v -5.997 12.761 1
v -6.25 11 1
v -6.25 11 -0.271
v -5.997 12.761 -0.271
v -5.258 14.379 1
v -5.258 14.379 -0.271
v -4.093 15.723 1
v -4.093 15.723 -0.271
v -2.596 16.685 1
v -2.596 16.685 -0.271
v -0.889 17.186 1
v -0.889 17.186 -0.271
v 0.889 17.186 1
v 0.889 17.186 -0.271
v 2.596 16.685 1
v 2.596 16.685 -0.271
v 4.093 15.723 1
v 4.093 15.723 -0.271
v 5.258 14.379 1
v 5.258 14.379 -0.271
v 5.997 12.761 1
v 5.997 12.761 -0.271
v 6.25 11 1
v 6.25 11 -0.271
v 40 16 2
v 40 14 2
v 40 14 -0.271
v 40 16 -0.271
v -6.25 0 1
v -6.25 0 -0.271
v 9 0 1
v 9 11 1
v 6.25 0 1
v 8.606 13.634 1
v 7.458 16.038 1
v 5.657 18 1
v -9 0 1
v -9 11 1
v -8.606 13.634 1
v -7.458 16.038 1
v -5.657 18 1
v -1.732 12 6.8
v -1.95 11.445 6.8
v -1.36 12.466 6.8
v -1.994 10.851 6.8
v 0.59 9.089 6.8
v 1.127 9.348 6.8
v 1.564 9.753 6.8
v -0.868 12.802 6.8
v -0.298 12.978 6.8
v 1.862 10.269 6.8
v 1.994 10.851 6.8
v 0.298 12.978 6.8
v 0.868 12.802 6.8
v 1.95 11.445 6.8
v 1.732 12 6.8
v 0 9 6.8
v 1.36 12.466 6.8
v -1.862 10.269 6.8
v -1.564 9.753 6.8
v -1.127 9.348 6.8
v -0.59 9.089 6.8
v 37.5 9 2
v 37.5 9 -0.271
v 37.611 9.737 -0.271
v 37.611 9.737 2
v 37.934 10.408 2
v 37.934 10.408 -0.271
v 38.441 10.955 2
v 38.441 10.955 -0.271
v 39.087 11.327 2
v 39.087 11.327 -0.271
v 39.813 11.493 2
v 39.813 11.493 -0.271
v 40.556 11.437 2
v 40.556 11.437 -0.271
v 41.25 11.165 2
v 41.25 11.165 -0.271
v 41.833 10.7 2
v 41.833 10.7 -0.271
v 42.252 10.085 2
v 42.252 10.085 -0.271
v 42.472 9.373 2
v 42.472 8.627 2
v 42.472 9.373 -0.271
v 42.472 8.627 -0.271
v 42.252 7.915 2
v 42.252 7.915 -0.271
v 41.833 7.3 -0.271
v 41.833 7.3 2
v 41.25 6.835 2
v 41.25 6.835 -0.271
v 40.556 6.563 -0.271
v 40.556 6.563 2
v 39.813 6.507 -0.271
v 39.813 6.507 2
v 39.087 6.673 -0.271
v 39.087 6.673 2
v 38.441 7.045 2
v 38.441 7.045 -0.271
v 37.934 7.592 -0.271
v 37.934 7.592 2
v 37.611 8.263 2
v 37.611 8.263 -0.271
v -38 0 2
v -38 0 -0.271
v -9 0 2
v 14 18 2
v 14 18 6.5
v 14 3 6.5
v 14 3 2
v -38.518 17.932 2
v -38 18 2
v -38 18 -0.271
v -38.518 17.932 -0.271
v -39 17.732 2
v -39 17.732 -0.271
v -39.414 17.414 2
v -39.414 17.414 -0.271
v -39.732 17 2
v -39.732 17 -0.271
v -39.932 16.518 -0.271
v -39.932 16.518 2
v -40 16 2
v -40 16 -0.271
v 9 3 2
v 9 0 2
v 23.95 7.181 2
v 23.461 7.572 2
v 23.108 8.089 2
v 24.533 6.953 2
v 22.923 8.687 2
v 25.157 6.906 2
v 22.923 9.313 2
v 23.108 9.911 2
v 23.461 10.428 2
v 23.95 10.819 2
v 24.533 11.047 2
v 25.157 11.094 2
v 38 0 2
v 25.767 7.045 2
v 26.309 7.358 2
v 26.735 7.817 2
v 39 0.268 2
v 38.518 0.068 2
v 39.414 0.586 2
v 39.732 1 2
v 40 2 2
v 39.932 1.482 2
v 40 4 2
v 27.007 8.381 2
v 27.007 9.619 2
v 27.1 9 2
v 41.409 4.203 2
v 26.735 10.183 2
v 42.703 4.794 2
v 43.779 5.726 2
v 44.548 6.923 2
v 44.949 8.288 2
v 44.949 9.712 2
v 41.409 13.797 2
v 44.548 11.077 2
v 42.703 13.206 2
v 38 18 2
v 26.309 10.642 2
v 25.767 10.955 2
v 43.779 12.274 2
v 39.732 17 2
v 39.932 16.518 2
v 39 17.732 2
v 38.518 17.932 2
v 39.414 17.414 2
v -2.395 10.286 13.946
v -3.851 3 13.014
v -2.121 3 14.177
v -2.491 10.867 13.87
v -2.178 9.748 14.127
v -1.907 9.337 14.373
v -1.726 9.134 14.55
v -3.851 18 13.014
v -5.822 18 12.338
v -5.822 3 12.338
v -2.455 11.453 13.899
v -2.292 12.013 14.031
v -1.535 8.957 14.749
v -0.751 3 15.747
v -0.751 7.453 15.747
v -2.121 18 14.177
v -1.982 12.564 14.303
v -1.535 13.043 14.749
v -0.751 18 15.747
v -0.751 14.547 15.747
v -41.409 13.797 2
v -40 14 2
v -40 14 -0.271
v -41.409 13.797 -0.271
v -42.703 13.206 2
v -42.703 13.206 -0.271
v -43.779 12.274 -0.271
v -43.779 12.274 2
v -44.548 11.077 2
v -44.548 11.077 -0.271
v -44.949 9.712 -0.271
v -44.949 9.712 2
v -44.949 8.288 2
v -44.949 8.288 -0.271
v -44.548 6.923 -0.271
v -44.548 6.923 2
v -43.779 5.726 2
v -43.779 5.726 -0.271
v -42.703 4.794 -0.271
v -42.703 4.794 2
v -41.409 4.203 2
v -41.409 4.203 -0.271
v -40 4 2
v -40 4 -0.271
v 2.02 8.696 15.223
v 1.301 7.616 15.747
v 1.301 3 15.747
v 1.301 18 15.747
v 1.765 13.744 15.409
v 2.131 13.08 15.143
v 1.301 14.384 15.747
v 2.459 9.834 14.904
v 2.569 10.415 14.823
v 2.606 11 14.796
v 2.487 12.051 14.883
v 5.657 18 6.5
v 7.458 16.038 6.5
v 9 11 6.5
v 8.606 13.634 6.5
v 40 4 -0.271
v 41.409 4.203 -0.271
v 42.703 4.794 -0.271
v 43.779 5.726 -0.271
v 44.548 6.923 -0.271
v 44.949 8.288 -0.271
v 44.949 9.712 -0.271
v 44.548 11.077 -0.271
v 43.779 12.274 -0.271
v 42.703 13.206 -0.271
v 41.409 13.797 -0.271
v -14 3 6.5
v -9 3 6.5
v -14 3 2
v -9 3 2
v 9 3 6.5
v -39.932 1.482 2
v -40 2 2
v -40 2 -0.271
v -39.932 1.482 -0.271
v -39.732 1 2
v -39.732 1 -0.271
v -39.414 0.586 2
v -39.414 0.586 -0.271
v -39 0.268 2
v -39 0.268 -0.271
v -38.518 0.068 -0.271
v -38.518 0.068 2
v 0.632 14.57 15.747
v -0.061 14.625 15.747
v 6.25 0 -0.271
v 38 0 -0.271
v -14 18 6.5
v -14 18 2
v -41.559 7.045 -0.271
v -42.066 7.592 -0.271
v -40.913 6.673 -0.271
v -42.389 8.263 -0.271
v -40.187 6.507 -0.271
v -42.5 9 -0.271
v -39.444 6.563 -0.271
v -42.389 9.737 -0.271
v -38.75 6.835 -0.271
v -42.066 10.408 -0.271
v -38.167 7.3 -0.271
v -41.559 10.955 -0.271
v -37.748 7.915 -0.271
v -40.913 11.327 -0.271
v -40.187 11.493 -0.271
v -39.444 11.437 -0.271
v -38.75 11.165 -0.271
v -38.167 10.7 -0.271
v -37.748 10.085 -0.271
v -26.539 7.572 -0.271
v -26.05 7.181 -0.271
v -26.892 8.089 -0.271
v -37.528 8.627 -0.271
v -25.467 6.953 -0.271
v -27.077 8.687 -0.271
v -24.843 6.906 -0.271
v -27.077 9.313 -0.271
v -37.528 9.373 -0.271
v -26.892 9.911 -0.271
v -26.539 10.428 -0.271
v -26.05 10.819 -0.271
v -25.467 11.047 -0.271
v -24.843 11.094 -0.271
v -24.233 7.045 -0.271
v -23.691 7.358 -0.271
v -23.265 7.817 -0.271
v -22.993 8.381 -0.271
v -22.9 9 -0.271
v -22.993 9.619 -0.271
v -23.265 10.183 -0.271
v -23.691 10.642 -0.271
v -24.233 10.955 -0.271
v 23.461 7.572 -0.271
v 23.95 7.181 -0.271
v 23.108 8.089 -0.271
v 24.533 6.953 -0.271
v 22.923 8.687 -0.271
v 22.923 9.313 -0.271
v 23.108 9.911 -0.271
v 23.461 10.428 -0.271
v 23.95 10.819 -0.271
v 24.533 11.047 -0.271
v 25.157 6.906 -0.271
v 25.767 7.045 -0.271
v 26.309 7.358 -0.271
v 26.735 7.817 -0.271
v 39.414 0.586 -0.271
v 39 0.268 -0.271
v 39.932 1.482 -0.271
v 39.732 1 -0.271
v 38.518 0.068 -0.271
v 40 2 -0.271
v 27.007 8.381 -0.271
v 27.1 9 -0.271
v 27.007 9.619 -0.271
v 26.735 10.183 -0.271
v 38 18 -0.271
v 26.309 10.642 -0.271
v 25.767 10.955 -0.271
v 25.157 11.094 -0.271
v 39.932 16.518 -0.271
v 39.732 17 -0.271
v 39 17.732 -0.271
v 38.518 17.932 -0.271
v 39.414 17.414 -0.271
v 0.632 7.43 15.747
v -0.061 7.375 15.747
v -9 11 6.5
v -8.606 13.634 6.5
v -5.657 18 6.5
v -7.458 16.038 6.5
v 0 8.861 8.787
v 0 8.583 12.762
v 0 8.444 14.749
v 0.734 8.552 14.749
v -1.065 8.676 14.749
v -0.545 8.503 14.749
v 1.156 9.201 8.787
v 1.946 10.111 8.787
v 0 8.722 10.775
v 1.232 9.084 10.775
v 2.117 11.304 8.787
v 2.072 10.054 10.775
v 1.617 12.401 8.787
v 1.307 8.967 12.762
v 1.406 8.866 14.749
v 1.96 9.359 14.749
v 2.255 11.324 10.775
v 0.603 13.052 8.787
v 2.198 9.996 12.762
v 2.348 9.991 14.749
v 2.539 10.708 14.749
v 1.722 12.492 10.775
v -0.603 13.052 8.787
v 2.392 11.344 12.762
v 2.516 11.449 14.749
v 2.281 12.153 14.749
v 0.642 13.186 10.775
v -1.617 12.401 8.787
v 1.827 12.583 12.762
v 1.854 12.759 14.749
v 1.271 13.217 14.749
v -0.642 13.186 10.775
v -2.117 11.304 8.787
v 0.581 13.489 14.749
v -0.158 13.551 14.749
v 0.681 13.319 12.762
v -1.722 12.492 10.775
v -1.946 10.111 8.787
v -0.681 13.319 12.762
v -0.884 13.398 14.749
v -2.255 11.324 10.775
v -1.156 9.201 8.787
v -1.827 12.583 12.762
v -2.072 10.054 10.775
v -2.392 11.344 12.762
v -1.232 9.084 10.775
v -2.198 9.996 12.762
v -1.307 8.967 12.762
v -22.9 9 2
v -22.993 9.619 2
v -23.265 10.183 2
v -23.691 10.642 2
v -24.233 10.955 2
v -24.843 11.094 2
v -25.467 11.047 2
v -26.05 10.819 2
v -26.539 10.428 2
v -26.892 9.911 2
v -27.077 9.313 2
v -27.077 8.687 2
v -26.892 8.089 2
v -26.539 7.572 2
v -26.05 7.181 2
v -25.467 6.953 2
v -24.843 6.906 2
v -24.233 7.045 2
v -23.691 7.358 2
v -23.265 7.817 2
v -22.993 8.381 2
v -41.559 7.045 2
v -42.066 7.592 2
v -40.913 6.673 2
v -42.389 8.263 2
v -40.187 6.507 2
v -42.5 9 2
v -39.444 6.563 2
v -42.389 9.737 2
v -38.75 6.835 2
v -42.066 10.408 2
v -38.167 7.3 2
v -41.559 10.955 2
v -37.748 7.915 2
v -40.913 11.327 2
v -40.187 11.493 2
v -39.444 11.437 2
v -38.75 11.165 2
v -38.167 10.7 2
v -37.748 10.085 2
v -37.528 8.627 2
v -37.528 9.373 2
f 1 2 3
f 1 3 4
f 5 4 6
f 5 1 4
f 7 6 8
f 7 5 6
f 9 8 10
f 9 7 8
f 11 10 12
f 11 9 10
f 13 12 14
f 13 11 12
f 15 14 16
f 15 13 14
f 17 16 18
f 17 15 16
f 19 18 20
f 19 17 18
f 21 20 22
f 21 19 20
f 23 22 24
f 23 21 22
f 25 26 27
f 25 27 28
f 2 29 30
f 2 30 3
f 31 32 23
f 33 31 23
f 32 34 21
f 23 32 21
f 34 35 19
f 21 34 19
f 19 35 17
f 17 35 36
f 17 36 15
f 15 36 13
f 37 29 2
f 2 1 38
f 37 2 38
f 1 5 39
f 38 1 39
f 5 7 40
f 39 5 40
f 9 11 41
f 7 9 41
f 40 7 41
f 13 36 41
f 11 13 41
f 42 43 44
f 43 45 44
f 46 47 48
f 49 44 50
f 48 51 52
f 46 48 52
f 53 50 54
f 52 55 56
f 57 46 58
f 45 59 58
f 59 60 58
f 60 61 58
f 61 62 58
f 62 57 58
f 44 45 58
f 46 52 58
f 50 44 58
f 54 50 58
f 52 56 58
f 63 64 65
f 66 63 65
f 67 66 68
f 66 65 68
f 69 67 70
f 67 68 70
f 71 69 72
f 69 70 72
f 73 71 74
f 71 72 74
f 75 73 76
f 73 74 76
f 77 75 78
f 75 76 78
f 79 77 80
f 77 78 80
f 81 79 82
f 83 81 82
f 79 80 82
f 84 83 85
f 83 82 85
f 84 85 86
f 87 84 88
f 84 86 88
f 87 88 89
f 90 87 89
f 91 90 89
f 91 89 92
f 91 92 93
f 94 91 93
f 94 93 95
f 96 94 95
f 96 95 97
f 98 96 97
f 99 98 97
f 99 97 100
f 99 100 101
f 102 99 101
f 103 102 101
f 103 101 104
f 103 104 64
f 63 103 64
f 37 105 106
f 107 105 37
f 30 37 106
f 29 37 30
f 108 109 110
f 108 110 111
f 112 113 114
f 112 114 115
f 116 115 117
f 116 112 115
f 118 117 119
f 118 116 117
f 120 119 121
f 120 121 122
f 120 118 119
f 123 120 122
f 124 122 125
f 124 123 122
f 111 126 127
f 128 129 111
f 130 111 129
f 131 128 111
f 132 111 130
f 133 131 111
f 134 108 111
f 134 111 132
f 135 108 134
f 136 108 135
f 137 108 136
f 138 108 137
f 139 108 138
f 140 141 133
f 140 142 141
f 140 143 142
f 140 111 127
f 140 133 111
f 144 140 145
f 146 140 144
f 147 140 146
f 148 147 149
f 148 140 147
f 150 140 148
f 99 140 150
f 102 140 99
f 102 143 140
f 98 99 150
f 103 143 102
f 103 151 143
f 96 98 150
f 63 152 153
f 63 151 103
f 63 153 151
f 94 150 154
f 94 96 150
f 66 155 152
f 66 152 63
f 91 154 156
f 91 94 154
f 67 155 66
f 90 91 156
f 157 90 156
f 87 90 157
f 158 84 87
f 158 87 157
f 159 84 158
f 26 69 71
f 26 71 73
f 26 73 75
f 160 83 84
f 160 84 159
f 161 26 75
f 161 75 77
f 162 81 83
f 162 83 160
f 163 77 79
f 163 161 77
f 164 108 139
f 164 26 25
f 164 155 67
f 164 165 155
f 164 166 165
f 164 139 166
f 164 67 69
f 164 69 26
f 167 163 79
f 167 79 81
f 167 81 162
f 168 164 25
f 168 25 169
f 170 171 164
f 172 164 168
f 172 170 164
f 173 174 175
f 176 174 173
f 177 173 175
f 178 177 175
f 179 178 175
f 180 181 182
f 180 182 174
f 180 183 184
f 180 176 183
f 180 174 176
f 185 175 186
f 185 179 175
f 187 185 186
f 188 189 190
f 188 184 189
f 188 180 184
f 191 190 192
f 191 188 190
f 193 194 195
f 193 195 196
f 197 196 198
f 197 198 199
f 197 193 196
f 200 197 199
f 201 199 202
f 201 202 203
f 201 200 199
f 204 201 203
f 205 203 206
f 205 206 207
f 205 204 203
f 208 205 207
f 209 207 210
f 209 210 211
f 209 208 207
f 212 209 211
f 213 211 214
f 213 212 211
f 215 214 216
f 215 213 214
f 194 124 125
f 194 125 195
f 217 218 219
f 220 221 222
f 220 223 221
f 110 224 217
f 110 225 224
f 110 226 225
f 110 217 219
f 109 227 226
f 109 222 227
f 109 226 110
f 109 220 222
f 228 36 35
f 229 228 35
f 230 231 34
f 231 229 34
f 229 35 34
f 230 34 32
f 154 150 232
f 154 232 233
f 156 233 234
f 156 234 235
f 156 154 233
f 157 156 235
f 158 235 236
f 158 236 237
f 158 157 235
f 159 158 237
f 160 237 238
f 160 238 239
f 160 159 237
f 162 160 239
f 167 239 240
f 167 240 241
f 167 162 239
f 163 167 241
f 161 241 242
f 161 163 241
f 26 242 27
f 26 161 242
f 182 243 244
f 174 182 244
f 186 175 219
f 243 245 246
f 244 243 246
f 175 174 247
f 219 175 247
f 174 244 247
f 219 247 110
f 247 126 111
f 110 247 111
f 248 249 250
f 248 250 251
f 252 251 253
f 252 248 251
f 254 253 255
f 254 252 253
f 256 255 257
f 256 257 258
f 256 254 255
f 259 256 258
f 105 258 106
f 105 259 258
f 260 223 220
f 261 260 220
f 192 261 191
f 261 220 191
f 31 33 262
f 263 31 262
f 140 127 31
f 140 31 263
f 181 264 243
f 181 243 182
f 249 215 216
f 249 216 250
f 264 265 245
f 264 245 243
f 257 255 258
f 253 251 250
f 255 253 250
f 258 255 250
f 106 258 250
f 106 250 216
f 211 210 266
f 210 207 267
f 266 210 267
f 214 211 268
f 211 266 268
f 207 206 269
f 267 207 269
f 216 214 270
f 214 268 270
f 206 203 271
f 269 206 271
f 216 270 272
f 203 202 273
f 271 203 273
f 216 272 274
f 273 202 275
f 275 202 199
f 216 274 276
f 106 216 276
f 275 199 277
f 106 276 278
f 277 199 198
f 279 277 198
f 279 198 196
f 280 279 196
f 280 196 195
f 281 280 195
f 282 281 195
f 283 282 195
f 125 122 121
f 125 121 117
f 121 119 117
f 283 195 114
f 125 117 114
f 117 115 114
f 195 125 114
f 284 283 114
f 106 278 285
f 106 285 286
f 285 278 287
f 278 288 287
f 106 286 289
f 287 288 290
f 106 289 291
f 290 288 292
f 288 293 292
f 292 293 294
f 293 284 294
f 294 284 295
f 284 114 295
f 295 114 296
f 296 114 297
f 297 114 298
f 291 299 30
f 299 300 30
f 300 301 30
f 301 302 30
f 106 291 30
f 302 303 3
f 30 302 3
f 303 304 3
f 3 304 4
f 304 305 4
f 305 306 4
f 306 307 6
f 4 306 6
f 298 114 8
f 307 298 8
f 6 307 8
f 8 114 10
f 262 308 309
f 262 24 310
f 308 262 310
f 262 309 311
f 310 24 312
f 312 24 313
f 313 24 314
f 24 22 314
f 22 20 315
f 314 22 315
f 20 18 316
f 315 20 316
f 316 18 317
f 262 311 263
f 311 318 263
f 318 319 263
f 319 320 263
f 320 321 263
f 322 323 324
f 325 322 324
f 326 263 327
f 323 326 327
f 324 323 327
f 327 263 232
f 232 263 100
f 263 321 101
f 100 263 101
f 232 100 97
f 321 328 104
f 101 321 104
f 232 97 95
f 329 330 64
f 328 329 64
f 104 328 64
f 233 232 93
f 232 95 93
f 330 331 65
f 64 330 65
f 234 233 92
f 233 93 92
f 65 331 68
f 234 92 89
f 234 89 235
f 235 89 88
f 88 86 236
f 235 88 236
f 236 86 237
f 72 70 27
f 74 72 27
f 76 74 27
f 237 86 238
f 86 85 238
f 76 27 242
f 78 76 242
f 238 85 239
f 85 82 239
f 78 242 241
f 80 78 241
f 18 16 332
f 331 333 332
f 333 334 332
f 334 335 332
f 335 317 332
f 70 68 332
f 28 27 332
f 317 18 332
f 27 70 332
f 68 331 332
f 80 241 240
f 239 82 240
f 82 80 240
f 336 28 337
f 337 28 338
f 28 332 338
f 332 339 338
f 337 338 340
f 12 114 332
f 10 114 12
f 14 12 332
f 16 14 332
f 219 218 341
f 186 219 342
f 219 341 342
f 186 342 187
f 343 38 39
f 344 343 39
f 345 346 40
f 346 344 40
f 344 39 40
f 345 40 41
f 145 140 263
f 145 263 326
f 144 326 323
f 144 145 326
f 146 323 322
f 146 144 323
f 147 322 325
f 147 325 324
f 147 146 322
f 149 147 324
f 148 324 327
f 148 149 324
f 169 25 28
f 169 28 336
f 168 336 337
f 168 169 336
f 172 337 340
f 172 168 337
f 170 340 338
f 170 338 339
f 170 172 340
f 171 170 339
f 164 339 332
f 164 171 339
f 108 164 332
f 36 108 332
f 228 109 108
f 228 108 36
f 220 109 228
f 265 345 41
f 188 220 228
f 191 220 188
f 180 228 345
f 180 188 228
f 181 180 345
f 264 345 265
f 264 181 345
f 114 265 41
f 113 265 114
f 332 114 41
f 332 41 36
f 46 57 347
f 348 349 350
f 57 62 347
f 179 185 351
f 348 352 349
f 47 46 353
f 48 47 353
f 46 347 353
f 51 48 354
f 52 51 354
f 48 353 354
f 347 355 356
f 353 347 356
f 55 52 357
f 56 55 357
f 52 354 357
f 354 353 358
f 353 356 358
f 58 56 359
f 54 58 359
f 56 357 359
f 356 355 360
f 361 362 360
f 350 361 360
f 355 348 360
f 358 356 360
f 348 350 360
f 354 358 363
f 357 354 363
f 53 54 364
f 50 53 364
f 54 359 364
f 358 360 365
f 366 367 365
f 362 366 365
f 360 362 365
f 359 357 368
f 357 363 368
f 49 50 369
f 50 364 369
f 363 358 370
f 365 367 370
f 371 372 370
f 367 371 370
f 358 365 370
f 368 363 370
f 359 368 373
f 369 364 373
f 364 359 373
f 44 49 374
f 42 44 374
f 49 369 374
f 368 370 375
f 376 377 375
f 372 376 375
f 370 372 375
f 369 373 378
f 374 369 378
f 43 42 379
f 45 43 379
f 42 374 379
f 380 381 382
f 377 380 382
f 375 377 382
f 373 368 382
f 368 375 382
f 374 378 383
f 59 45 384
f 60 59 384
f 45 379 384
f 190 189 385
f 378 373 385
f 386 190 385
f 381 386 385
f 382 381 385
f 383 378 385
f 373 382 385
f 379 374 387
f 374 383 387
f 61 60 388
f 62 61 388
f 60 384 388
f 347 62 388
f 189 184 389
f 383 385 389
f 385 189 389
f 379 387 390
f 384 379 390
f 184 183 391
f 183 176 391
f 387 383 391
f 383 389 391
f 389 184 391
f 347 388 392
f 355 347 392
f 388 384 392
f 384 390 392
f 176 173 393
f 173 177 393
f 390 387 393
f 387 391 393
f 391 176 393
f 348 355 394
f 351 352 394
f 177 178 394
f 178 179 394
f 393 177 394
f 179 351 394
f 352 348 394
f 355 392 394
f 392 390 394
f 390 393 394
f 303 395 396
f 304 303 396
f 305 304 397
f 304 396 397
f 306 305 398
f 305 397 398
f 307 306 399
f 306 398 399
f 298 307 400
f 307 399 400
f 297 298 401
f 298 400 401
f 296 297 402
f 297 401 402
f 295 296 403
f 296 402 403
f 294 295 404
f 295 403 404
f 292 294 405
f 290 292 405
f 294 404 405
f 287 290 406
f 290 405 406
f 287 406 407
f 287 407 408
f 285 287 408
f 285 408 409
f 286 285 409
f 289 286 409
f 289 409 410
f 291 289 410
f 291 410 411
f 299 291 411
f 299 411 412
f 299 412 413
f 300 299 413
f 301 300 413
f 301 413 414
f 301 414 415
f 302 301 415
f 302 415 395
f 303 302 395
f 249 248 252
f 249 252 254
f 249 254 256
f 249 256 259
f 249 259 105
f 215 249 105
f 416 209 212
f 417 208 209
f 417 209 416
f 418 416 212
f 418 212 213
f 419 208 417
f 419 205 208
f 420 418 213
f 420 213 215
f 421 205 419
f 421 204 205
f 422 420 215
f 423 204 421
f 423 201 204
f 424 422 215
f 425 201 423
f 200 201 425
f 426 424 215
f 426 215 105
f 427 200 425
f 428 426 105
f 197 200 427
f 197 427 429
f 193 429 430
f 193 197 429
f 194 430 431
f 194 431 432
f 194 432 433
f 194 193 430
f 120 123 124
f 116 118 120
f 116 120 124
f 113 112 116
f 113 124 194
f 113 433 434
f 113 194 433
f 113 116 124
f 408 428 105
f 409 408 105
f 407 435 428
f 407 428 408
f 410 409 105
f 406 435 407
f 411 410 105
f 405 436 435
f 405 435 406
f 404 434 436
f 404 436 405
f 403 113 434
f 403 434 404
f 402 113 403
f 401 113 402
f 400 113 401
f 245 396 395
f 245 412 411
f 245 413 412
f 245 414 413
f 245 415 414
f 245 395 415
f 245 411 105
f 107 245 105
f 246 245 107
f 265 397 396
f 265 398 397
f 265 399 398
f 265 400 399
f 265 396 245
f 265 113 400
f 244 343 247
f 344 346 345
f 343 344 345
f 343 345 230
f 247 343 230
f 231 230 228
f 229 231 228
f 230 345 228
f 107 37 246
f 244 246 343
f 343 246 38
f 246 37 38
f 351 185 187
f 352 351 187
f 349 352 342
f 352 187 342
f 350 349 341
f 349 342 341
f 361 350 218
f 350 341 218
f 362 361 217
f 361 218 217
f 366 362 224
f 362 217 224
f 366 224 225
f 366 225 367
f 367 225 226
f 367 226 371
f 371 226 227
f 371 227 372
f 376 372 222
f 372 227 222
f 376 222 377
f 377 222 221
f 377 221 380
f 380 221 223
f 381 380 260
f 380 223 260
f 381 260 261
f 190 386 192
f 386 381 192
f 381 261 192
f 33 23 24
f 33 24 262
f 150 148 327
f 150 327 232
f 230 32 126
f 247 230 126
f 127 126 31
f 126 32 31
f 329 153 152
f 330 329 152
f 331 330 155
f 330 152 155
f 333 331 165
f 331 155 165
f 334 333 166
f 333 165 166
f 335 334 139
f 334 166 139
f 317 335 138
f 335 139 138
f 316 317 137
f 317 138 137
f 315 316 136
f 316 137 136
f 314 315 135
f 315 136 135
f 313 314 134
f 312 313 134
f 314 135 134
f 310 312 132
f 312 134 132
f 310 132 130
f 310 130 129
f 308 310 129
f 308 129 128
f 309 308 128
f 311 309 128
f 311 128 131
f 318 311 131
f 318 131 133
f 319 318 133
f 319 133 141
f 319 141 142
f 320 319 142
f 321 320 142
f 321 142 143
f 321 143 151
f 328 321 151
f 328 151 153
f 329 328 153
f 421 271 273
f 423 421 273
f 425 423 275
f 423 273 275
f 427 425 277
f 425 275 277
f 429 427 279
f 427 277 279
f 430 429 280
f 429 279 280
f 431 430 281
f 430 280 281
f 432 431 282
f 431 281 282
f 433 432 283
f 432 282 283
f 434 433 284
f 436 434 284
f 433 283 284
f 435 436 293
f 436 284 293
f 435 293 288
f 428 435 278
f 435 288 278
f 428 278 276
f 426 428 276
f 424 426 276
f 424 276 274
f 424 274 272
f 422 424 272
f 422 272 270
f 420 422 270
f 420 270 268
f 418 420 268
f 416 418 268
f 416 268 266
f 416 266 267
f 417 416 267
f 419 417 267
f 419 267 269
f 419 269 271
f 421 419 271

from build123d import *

# Parameters (mm, degrees)
BOSS_EXTRUDE1_DEPTH            = 15
CHAMFER1_SIZE                  = 1.802121321
CHAMFER2_SIZE                  = 1.802121321
CUT_EXTRUDE1_REACH             = 26.607
BOSS_EXTRUDE2_DEPTH            = 2.271122456
CUT_EXTRUDE2_REACH             = 52.66
F_4_2_4_2_DIAMETER_HOLE1_D     = 4.2
F_4_2_4_2_DIAMETER_HOLE1_DEPTH = 16.017925233
F_4_2_4_2_DIAMETER_HOLE2_D     = 4.2
F_4_2_4_2_DIAMETER_HOLE2_DEPTH = 16.017925233
F_5_0_5_DIAMETER_HOLE1_D       = 5
F_5_0_5_DIAMETER_HOLE2_D       = 5


with BuildPart() as part:
    # Sketch1 → Boss-Extrude1 (new body)
    with BuildSketch(Plane(origin=(0, 18, 0), x_dir=(1, 0, 0), z_dir=(0, 1, 0))):
        with BuildLine():
            Line((14, -6.5), (14, -2))
            Line((14, -2), (-14, -2))
            Line((-14, -2), (-14, -6.5))
            Line((-14, -6.5), (-5.822354851, -12.337757006))
            ThreePointArc((-5.822354851, -12.337757006), (-2.456495727, -13.897392525), (-0.156010119, -16.807587804))
            Line((-0.156010119, -16.807587804), (14, -6.5))
        make_face()
    extrude(amount=-BOSS_EXTRUDE1_DEPTH)

    # Sketch2 → Hole1 (revolve, cut)
    with BuildSketch(Plane(origin=(0, 11, 16.807587804), x_dir=(0, -1, 0), z_dir=(1, 0, 0))):
        Polygon((0, 0), (0, 10.007587804), (2, 10.007587804), (2.69979871, 0), align=None)
    revolve(axis=Axis((0, 11, -93.192412196), (0, 0, 1)), mode=Mode.SUBTRACT)

    # Chamfer1
    # the kernel refuses this chamfer: 1.802121321, 1.16968541 mm, written as the material it takes off along each edge
    with BuildSketch(Plane(origin=(-0.156010119, 12.956909278, 16.807587804), x_dir=(0.8084016240923299, 0, -0.5886313057975113), z_dir=(0, -1, 0))) as chamfer1_piece_1:
        with BuildLine():
            Line((CHAMFER1_SIZE, 0), (0.14359278, -1.207644556))
            ThreePointArc((0.14359278, -1.207644556), (0.096853733, -0.618716026), (0, 0))
            Line((0, 0), (CHAMFER1_SIZE, 0))
        make_face()
    extrude(amount=14.60910591, mode=Mode.SUBTRACT)

    # Chamfer2
    # the kernel refuses this chamfer: 1.802121321, 1.16968541 mm, written as the material it takes off along each edge
    with BuildSketch(Plane(origin=(-0.156010119, 22.652196632, 16.807587804), x_dir=(0.8084016240923299, 0, -0.5886313057975113), z_dir=(0, -1, 0))) as chamfer2_piece_1:
        with BuildLine():
            Line((CHAMFER2_SIZE, 0), (0.14359278, -1.207644556))
            ThreePointArc((0.14359278, -1.207644556), (0.096853733, -0.618716026), (0, 0))
            Line((0, 0), (CHAMFER2_SIZE, 0))
        make_face()
    extrude(amount=13.60910591, mode=Mode.SUBTRACT)

    # Chamfer3: read off the stored shape, not the designer's step
    # Chamfer3 outline → Chamfer3 (revolve, cut)
    with BuildSketch(Plane.XZ.offset(-11)):
        Polygon((2.555864922, 15.746802777), (2.555864922, 14.749238727), (3.625621395, 15.746802777), align=None)
    revolve(axis=Axis((0, 11, 0), (0, 0, 1)), mode=Mode.SUBTRACT)

    # Sketch4 → Cut-Extrude1 (cut, up to next)
    with BuildSketch(Plane.XY.offset(6.5), mode=Mode.PRIVATE) as cut_extrude1_sk1:
        with BuildLine():
            Line((9, 3), (9, 11))
            ThreePointArc((9, 11), (8.121320344, 14.878679656), (5.656854249, 18))
            Line((5.656854249, 18), (-5.656854249, 18))
            ThreePointArc((-5.656854249, 18), (-8.121320344, 14.878679656), (-9, 11))
            Line((-9, 11), (-9, 3))
            Line((-9, 3), (9, 3))
        make_face()
    cut_extrude1_tool1 = extrude(cut_extrude1_sk1.sketch, amount=-CUT_EXTRUDE1_REACH, mode=Mode.PRIVATE) & part.part
    add(cut_extrude1_tool1.solids().sort_by_distance((0, 10.176322, 6.5))[0], mode=Mode.SUBTRACT)

    # Sketch5 → Boss-Extrude2 (add)
    with BuildSketch(Plane.XY.offset(2)):
        with BuildLine():
            Line((-6.25, 0), (-6.25, 11))
            ThreePointArc((-6.25, 11), (0, 17.25), (6.25, 11))
            Line((6.25, 11), (6.25, 0))
            Line((6.25, 0), (38, 0))
            ThreePointArc((38, 0), (39.414213562, 0.585786438), (40, 2))
            Line((40, 2), (40, 4))
            ThreePointArc((40, 4), (45, 9), (40, 14))
            Line((40, 14), (40, 16))
            ThreePointArc((40, 16), (39.414213562, 17.414213562), (38, 18))
            Line((38, 18), (-38, 18))
            ThreePointArc((-38, 18), (-39.414213562, 17.414213562), (-40, 16))
            Line((-40, 16), (-40, 14))
            ThreePointArc((-40, 14), (-45, 9), (-40, 4))
            Line((-40, 4), (-40, 2))
            ThreePointArc((-40, 2), (-39.414213562, 0.585786438), (-38, 0))
            Line((-38, 0), (-6.25, 0))
        make_face()
    extrude(amount=-BOSS_EXTRUDE2_DEPTH)

    # Sketch6 → Cut-Extrude2 (cut, up to next)
    with BuildSketch(Plane(origin=(0, 0, 1), x_dir=(-1, 0, 0), z_dir=(0, 0, -1)), mode=Mode.PRIVATE) as cut_extrude2_sk1:
        with BuildLine():
            Line((-9, 11), (-9, 0))
            Line((-9, 0), (-6.25, 0))
            Line((-6.25, 0), (-6.25, 11))
            ThreePointArc((-6.25, 11), (0, 17.25), (6.25, 11))
            Line((6.25, 11), (6.25, 0))
            Line((6.25, 0), (9, 0))
            Line((9, 0), (9, 11))
            ThreePointArc((9, 11), (8.121320344, 14.878679656), (5.656854249, 18))
            Line((5.656854249, 18), (-5.656854249, 18))
            ThreePointArc((-5.656854249, 18), (-8.121320344, 14.878679656), (-9, 11))
        make_face()
    cut_extrude2_tool1 = extrude(cut_extrude2_sk1.sketch, amount=-CUT_EXTRUDE2_REACH, mode=Mode.PRIVATE) & part.part
    add(cut_extrude2_tool1.solids().sort_by_distance((7.891615, 14.768974, 1))[0], mode=Mode.SUBTRACT)

    # Ø4.2 (4.2) Diameter Hole1
    with Locations(Plane(origin=(0, 0, -0.271122456), x_dir=(-1, 0, 0), z_dir=(0, 0, -1))):
        with Locations((25, 9)):
            Hole(F_4_2_4_2_DIAMETER_HOLE1_D / 2, depth=F_4_2_4_2_DIAMETER_HOLE1_DEPTH)

    # Ø4.2 (4.2) Diameter Hole2
    with Locations(Plane(origin=(0, 0, -0.271122456), x_dir=(-1, 0, 0), z_dir=(0, 0, -1))):
        with Locations((-25, 9)):
            Hole(F_4_2_4_2_DIAMETER_HOLE2_D / 2, depth=F_4_2_4_2_DIAMETER_HOLE2_DEPTH)

    # Ø5.0 (5) Diameter Hole1 (through all)
    with Locations(Plane.XY.offset(2)):
        with Locations((40, 9)):
            Hole(F_5_0_5_DIAMETER_HOLE1_D / 2)

    # Ø5.0 (5) Diameter Hole2 (through all)
    with Locations(Plane.XY.offset(2)):
        with Locations((-40, 9)):
            Hole(F_5_0_5_DIAMETER_HOLE2_D / 2)


solid = part.part
